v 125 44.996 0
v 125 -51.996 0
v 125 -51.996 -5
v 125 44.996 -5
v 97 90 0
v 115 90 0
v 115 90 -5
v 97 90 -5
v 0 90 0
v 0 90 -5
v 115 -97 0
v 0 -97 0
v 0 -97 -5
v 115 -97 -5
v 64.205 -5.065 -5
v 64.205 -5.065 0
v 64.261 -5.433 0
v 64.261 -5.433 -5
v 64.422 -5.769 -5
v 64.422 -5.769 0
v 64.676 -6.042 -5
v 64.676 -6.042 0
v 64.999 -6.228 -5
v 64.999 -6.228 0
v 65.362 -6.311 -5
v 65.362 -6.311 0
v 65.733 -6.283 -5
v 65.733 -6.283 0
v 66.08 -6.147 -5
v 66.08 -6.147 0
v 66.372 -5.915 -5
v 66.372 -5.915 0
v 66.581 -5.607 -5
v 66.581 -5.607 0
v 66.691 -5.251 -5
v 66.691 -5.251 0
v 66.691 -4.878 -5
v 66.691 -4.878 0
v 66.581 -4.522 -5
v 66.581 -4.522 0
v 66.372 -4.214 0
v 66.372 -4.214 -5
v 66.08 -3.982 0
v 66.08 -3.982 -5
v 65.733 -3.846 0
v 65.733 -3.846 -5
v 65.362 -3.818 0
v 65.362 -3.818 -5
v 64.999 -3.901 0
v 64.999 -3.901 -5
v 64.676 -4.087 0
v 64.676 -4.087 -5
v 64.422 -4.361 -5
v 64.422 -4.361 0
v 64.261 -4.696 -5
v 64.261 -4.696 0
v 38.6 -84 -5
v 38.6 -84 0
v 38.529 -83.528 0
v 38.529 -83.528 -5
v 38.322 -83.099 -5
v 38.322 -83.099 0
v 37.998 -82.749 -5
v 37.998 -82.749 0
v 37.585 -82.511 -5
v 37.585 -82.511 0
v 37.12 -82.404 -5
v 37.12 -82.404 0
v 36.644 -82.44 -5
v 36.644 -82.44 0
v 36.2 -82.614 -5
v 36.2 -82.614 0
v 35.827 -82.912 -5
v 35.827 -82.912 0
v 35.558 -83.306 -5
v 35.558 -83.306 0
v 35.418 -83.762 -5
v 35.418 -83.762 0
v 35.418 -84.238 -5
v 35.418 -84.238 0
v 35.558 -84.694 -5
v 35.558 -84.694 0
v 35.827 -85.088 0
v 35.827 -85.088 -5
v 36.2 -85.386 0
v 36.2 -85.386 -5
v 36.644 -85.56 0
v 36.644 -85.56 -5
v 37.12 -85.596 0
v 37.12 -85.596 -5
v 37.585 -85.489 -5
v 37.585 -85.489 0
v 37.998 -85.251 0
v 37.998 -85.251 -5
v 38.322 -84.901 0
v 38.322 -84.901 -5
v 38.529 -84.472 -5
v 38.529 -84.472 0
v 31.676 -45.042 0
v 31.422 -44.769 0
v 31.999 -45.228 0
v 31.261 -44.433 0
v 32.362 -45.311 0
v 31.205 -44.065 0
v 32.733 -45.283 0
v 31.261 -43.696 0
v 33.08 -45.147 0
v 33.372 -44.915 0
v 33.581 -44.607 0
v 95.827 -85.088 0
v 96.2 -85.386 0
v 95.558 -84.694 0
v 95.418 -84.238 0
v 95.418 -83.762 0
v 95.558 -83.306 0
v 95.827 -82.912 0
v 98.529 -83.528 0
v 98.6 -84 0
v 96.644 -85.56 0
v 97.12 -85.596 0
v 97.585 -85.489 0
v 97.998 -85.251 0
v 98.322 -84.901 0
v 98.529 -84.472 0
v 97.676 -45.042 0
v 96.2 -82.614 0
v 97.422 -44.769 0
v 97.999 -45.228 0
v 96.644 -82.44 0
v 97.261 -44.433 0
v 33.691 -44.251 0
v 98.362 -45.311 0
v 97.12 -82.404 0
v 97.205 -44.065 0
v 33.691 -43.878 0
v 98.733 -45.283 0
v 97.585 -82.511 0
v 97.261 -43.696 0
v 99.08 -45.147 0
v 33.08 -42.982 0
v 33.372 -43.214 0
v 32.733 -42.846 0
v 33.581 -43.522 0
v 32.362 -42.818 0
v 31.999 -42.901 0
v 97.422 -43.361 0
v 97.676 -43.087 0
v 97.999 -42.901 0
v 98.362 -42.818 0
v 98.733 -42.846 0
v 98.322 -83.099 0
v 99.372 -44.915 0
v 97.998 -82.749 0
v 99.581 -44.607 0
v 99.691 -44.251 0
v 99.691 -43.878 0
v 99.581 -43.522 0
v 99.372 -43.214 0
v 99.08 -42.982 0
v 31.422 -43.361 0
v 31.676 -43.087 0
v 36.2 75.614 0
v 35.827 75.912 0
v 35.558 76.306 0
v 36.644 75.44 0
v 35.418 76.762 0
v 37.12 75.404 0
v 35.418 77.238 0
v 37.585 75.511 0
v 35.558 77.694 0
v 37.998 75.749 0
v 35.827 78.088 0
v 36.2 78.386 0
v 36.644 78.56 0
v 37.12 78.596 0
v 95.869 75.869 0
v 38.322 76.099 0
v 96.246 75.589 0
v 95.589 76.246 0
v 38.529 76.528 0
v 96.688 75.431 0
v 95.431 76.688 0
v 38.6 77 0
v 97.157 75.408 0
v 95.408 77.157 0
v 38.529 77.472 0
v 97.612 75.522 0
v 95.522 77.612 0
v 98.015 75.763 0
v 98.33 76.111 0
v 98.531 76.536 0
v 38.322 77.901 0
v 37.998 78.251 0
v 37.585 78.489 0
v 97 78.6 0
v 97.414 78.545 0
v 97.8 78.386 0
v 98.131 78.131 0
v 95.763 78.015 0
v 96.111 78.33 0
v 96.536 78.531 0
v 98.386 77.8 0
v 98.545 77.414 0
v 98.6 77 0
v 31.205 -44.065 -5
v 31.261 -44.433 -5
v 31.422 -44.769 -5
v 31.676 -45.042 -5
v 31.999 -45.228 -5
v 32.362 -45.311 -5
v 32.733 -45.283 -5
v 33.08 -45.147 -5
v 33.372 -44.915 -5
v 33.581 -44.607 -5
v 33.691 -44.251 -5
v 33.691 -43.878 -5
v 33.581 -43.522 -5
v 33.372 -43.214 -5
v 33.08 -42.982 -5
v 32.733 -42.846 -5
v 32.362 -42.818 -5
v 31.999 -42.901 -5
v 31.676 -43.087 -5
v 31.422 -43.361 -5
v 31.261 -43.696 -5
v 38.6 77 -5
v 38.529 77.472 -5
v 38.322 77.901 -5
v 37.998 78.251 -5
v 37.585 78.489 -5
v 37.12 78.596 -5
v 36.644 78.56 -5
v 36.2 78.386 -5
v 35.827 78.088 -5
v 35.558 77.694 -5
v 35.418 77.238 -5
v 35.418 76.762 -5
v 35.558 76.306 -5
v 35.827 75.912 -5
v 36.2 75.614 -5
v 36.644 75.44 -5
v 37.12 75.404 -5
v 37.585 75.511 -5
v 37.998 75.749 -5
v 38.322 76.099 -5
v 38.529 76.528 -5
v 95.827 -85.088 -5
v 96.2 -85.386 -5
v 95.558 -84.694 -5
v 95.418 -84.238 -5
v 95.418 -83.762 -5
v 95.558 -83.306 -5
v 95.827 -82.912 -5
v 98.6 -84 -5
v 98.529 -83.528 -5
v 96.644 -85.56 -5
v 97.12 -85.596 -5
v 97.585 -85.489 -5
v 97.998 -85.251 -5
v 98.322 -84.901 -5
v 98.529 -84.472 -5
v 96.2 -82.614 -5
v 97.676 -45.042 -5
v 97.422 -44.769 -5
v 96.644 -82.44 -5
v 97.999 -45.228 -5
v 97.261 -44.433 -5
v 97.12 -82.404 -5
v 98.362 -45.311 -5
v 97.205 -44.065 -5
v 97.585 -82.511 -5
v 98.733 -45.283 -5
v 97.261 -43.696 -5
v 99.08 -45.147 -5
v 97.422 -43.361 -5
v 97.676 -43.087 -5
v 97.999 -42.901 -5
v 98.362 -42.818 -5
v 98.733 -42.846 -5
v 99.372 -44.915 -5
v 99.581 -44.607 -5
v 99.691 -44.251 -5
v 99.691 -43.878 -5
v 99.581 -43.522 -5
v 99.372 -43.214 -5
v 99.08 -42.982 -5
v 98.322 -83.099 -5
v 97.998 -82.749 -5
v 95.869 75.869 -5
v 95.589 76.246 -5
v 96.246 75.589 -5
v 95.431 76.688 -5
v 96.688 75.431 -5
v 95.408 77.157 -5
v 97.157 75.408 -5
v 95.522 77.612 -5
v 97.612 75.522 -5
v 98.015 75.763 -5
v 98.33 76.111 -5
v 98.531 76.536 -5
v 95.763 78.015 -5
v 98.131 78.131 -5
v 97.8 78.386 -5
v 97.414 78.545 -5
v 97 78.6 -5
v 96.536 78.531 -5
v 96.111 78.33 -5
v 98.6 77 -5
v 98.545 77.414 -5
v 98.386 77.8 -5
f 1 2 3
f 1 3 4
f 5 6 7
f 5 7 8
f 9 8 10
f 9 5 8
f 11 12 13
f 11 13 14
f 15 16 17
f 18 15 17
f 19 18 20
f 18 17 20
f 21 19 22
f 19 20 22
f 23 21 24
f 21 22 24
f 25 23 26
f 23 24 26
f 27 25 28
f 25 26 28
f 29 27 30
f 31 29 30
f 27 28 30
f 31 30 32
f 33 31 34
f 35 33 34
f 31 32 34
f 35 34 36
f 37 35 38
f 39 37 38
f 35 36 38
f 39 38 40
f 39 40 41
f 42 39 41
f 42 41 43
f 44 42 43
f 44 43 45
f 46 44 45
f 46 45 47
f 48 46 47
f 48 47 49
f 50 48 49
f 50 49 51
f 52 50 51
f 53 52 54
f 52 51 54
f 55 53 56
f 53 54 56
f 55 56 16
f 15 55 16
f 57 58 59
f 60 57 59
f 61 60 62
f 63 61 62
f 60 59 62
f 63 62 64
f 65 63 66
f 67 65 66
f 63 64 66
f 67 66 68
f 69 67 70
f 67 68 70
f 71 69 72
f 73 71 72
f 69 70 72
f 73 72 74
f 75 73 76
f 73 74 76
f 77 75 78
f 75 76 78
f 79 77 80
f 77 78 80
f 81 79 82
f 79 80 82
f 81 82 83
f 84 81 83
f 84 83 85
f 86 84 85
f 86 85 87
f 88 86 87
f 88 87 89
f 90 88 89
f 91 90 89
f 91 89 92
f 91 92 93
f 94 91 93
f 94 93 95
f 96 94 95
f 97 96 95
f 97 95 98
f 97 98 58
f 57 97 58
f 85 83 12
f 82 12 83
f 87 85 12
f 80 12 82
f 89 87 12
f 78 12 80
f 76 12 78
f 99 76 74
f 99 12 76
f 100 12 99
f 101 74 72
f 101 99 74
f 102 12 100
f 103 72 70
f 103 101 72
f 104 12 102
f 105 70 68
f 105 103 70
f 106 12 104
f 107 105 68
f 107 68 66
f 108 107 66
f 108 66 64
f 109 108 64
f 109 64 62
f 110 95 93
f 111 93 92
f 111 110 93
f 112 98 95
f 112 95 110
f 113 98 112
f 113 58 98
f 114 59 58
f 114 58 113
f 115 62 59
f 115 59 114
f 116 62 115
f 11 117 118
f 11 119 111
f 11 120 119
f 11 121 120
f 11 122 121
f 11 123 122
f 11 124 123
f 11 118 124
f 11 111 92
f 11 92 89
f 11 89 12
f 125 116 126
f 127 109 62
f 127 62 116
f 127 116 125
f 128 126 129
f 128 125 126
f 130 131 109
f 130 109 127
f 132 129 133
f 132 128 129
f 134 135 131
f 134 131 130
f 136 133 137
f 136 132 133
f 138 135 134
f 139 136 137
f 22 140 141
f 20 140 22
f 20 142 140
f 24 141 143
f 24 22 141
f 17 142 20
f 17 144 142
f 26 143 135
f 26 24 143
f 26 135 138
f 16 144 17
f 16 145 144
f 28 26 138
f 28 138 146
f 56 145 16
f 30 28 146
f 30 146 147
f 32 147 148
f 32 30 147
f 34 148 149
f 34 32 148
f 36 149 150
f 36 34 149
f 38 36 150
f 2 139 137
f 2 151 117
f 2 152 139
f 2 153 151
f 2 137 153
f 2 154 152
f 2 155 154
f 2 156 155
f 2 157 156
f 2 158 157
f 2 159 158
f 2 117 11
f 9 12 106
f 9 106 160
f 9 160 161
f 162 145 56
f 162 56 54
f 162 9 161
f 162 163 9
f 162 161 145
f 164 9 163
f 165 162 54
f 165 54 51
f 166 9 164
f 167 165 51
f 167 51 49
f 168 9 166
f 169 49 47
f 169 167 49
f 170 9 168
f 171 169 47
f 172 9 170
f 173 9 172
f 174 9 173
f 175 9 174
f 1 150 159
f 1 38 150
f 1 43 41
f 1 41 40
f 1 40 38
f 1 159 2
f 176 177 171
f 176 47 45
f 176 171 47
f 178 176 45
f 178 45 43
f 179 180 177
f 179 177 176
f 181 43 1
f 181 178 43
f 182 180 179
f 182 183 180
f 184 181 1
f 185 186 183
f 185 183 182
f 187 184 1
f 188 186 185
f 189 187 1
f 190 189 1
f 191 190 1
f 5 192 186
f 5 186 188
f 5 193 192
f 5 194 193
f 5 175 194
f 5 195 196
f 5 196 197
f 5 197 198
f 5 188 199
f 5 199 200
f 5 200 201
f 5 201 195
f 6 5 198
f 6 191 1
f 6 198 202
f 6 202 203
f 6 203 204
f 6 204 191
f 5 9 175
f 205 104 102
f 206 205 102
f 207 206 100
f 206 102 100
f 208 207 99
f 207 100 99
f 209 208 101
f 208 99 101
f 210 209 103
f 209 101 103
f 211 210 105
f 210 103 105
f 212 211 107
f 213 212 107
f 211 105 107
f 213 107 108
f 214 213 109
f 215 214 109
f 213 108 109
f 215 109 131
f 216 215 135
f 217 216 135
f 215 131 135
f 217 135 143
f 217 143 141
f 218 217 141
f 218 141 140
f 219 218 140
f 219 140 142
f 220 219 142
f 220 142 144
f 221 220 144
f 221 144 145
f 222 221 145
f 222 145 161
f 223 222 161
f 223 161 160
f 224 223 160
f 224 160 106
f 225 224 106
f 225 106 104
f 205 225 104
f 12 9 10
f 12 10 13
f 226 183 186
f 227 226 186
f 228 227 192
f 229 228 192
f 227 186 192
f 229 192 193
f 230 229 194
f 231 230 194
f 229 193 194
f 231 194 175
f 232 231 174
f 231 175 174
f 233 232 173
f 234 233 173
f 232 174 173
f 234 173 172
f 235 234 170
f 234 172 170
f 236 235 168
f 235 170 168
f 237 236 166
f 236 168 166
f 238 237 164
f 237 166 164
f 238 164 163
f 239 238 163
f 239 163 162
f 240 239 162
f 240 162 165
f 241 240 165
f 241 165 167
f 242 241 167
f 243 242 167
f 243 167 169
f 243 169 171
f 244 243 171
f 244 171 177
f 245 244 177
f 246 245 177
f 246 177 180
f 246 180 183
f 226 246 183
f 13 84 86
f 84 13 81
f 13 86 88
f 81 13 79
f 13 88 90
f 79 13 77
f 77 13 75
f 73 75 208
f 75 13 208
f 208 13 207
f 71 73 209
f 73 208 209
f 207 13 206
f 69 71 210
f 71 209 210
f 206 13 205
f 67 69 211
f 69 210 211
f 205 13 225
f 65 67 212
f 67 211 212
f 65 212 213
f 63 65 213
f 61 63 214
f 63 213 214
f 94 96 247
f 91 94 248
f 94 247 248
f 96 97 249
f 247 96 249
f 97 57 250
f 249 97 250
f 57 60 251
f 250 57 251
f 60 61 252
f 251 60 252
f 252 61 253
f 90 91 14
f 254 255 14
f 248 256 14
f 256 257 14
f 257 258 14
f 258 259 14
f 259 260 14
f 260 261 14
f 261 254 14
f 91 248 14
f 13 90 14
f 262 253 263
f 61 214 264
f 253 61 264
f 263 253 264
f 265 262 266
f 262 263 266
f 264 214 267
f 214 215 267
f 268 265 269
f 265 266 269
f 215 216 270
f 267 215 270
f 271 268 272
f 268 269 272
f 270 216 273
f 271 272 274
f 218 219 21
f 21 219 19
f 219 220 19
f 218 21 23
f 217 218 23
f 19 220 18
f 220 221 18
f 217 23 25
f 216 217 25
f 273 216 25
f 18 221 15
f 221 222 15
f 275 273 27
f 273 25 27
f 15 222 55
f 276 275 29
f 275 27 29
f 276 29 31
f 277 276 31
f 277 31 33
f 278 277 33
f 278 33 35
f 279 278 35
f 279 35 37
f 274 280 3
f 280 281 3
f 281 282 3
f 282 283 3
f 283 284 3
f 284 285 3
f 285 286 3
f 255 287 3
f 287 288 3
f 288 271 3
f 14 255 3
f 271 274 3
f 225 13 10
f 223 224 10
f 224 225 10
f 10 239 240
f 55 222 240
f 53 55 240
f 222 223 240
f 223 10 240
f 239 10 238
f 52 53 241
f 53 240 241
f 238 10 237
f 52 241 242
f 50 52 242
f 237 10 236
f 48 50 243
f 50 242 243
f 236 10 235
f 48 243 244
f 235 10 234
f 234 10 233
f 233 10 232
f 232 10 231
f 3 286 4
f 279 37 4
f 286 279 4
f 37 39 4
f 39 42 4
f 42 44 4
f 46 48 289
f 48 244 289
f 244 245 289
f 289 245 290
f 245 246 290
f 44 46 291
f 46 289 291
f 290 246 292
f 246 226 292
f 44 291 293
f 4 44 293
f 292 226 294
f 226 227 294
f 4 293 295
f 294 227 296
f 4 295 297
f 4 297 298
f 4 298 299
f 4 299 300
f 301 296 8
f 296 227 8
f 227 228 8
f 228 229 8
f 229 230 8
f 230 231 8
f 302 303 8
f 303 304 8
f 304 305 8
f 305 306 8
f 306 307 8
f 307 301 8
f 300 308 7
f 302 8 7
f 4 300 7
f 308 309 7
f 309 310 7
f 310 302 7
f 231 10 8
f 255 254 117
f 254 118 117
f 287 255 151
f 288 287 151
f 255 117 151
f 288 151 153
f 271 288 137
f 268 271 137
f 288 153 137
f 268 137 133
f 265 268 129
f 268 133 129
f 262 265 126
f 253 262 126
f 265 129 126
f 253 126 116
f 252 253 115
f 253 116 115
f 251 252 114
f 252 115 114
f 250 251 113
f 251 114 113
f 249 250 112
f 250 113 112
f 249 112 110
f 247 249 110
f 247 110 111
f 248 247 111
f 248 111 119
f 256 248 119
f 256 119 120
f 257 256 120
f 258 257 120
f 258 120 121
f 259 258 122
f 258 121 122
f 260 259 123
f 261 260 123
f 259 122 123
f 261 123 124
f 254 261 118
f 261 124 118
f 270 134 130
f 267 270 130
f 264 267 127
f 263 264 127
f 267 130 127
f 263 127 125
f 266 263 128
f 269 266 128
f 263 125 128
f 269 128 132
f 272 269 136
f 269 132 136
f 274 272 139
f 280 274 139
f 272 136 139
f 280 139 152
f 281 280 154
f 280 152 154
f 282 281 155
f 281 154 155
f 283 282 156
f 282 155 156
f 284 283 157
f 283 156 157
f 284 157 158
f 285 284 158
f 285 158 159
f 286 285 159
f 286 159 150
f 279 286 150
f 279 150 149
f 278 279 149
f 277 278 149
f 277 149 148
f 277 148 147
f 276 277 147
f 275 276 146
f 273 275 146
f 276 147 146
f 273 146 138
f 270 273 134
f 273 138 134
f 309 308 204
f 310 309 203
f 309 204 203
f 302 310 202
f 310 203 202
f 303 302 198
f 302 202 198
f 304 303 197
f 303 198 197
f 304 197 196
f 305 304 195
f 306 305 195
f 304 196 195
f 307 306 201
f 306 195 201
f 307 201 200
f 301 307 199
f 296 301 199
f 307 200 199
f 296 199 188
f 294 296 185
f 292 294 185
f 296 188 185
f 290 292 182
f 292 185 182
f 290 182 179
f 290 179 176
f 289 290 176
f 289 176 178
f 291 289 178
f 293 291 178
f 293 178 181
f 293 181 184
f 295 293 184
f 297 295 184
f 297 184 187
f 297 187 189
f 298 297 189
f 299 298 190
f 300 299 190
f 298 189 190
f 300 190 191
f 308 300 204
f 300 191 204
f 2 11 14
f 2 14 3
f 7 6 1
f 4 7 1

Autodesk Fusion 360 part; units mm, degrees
sketch "Sketch1" plane through (0, 0, 0) normal (0, 0, 1) x (1, 0, 0)
  line L0 (125, 90) -> (-125, 90)
  line L1 (-125, 90) -> (-125, -90)
  line L2 (-125, -90) -> (125, -90)
  line L3 (125, -90) -> (125, 90)
  line L4 (125, 90) -> (-125, -90) construction
  line L5 (-125, 90) -> (125, -90) construction
  line L6 (0, 90) -> (-97, 90)
  line L7 (0, 0) -> (0, 90)
  line L8 (0, 90) -> (97, 90)
  line L9 (-97, 90) -> (-97, 77)
  circle A0 centre (-97, 77) radius 1.6
  line L10 (0, 90) -> (-37, 90)
  line L11 (-37, 90) -> (-37, 77)
  circle A1 centre (-37, 77) radius 1.6
  line L12 (97, 90) -> (97, 77)
  line L13 (0, 90) -> (-115, 90)
  line L14 (-115, 90) -> (-125, 44.9959)
  line L15 (-125, 44.9959) -> (-125, 90)
  line L16 (-125, 90) -> (-115, 90)
  line L17 (0, 0) -> (0, -90)
  line L18 (115, 90) -> (125, 44.9959)
  line L19 (125, 44.9959) -> (125, 90)
  line L20 (125, 90) -> (115, 90)
  line L21 (-125, -44.9959) -> (-125, -90)
  line L22 (-125, -90) -> (-115, -90)
  line L23 (125, -44.9959) -> (125, -90)
  line L24 (125, -90) -> (115, -90)
  line L25 (-97, 77) -> (-97, -84)
  line L26 (-97, -84) -> (-97, -90)
  line L27 (-97, -84) -> (-97, -97)
  line L28 (-97, -97) -> (-125.0061, -97)
  line L29 (-125.0061, -97) -> (-125, -90)
  line L30 (-97, -97) -> (125, -97)
  line L31 (125, -97) -> (125, -90)
  line L32 (-37, 77) -> (-37, -84)
  circle A2 centre (-97, -84) radius 1.6
  circle A3 centre (-37, -84) radius 1.6
  circle A4 centre (97, -84) radius 1.6
  circle A5 centre (37, -84) radius 1.6
  circle A6 centre (97, 77) radius 1.6
  circle A7 centre (37, 77) radius 1.6
  line L33 (0, -97) -> (0, 90)
  line L34 (-125.0061, -97) -> (-125.0061, -3.5)
  line L35 (-125.0061, -3.5) -> (125, -3.5)
  line L36 (115, 90) -> (125, 44.9959)
  line L37 (-115, -97) -> (-125, -51.9959)
  line L38 (115, -97) -> (125, -51.9959)
  dimension "d1" = 250
  dimension "d2" = 180
  dimension "d3" = 97
  dimension "d4" = 13
  dimension "d5" = 3.2
  dimension "d6" = 37
  dimension "d7" = 13
  dimension "d8" = 3.2
  dimension "d9" = 115
  dimension "d14" = 161
  dimension "d15" = 13
  dimension "d16" = 161
  dimension "d17" = 3.2
  dimension "d18" = 3.2
  dimension "d19" = 93.5
extrude "Extrude3" add sketch "Sketch1" against normal blind 5 contours A6 | L0 L3 L7 L8 L17 L18 L33 L35 L36 | L2 L3 L17 L23 L24 L33 L35 L38 | L2 L24 L30 L33 L38 | A4 | A5 | A7
extrude "Extrude4" cut sketch "Sketch1" against normal blind 10 contours A6 | L11 A1 L32 | L9 A0 L25 | L25 L26 L27 A2 | A4 | A5 | A7 picked at (-36.3624, 76.1483) picked at (-96.2477, 77.7523) picked at (-96.2477, -84.7523)
sketch "Sketch3" plane through (0, 0, 0) normal (0, 0, 1) x (-1, 0, 0)
  circle A0 centre (-97, 84) radius 1.6
  circle A1 centre (-97, -77) radius 1.6
  circle A2 centre (-37, 84) radius 1.6
  circle A3 centre (-37, -77) radius 1.6
  line L0 (0, 97) -> (-115, 97)
  line L1 (-115, 97) -> (-125, 51.9959)
  line L2 (-125, 51.9959) -> (-125, -44.9959)
  line L3 (-125, -44.9959) -> (-115, -90)
  line L4 (-115, -90) -> (0, -90)
  line L5 (0, -90) -> (0, 97)
  line L6 (0, 97) -> (-115, 97)
  line L7 (-32.4552, 44.0647) -> (-98.4552, 44.0647)
  circle A4 centre (-32.4552, 44.0647) radius 1.25
  circle A5 centre (-98.4552, 44.0647) radius 1.25
  line L8 (-65.4552, 44.0647) -> (-65.4552, 5.0647)
  circle A6 centre (-65.4552, 5.0647) radius 1.25
  dimension "d28" = 115
  dimension "d29" = 60
  dimension "d30" = 66
  dimension "d31" = 2.5
  dimension "d32" = 2.5
  dimension "d33" = 39
  dimension "d34" = 2.5
extrude "Extrude6" cut sketch "Sketch3" against normal blind 30 contours A5 | A4 | A6
